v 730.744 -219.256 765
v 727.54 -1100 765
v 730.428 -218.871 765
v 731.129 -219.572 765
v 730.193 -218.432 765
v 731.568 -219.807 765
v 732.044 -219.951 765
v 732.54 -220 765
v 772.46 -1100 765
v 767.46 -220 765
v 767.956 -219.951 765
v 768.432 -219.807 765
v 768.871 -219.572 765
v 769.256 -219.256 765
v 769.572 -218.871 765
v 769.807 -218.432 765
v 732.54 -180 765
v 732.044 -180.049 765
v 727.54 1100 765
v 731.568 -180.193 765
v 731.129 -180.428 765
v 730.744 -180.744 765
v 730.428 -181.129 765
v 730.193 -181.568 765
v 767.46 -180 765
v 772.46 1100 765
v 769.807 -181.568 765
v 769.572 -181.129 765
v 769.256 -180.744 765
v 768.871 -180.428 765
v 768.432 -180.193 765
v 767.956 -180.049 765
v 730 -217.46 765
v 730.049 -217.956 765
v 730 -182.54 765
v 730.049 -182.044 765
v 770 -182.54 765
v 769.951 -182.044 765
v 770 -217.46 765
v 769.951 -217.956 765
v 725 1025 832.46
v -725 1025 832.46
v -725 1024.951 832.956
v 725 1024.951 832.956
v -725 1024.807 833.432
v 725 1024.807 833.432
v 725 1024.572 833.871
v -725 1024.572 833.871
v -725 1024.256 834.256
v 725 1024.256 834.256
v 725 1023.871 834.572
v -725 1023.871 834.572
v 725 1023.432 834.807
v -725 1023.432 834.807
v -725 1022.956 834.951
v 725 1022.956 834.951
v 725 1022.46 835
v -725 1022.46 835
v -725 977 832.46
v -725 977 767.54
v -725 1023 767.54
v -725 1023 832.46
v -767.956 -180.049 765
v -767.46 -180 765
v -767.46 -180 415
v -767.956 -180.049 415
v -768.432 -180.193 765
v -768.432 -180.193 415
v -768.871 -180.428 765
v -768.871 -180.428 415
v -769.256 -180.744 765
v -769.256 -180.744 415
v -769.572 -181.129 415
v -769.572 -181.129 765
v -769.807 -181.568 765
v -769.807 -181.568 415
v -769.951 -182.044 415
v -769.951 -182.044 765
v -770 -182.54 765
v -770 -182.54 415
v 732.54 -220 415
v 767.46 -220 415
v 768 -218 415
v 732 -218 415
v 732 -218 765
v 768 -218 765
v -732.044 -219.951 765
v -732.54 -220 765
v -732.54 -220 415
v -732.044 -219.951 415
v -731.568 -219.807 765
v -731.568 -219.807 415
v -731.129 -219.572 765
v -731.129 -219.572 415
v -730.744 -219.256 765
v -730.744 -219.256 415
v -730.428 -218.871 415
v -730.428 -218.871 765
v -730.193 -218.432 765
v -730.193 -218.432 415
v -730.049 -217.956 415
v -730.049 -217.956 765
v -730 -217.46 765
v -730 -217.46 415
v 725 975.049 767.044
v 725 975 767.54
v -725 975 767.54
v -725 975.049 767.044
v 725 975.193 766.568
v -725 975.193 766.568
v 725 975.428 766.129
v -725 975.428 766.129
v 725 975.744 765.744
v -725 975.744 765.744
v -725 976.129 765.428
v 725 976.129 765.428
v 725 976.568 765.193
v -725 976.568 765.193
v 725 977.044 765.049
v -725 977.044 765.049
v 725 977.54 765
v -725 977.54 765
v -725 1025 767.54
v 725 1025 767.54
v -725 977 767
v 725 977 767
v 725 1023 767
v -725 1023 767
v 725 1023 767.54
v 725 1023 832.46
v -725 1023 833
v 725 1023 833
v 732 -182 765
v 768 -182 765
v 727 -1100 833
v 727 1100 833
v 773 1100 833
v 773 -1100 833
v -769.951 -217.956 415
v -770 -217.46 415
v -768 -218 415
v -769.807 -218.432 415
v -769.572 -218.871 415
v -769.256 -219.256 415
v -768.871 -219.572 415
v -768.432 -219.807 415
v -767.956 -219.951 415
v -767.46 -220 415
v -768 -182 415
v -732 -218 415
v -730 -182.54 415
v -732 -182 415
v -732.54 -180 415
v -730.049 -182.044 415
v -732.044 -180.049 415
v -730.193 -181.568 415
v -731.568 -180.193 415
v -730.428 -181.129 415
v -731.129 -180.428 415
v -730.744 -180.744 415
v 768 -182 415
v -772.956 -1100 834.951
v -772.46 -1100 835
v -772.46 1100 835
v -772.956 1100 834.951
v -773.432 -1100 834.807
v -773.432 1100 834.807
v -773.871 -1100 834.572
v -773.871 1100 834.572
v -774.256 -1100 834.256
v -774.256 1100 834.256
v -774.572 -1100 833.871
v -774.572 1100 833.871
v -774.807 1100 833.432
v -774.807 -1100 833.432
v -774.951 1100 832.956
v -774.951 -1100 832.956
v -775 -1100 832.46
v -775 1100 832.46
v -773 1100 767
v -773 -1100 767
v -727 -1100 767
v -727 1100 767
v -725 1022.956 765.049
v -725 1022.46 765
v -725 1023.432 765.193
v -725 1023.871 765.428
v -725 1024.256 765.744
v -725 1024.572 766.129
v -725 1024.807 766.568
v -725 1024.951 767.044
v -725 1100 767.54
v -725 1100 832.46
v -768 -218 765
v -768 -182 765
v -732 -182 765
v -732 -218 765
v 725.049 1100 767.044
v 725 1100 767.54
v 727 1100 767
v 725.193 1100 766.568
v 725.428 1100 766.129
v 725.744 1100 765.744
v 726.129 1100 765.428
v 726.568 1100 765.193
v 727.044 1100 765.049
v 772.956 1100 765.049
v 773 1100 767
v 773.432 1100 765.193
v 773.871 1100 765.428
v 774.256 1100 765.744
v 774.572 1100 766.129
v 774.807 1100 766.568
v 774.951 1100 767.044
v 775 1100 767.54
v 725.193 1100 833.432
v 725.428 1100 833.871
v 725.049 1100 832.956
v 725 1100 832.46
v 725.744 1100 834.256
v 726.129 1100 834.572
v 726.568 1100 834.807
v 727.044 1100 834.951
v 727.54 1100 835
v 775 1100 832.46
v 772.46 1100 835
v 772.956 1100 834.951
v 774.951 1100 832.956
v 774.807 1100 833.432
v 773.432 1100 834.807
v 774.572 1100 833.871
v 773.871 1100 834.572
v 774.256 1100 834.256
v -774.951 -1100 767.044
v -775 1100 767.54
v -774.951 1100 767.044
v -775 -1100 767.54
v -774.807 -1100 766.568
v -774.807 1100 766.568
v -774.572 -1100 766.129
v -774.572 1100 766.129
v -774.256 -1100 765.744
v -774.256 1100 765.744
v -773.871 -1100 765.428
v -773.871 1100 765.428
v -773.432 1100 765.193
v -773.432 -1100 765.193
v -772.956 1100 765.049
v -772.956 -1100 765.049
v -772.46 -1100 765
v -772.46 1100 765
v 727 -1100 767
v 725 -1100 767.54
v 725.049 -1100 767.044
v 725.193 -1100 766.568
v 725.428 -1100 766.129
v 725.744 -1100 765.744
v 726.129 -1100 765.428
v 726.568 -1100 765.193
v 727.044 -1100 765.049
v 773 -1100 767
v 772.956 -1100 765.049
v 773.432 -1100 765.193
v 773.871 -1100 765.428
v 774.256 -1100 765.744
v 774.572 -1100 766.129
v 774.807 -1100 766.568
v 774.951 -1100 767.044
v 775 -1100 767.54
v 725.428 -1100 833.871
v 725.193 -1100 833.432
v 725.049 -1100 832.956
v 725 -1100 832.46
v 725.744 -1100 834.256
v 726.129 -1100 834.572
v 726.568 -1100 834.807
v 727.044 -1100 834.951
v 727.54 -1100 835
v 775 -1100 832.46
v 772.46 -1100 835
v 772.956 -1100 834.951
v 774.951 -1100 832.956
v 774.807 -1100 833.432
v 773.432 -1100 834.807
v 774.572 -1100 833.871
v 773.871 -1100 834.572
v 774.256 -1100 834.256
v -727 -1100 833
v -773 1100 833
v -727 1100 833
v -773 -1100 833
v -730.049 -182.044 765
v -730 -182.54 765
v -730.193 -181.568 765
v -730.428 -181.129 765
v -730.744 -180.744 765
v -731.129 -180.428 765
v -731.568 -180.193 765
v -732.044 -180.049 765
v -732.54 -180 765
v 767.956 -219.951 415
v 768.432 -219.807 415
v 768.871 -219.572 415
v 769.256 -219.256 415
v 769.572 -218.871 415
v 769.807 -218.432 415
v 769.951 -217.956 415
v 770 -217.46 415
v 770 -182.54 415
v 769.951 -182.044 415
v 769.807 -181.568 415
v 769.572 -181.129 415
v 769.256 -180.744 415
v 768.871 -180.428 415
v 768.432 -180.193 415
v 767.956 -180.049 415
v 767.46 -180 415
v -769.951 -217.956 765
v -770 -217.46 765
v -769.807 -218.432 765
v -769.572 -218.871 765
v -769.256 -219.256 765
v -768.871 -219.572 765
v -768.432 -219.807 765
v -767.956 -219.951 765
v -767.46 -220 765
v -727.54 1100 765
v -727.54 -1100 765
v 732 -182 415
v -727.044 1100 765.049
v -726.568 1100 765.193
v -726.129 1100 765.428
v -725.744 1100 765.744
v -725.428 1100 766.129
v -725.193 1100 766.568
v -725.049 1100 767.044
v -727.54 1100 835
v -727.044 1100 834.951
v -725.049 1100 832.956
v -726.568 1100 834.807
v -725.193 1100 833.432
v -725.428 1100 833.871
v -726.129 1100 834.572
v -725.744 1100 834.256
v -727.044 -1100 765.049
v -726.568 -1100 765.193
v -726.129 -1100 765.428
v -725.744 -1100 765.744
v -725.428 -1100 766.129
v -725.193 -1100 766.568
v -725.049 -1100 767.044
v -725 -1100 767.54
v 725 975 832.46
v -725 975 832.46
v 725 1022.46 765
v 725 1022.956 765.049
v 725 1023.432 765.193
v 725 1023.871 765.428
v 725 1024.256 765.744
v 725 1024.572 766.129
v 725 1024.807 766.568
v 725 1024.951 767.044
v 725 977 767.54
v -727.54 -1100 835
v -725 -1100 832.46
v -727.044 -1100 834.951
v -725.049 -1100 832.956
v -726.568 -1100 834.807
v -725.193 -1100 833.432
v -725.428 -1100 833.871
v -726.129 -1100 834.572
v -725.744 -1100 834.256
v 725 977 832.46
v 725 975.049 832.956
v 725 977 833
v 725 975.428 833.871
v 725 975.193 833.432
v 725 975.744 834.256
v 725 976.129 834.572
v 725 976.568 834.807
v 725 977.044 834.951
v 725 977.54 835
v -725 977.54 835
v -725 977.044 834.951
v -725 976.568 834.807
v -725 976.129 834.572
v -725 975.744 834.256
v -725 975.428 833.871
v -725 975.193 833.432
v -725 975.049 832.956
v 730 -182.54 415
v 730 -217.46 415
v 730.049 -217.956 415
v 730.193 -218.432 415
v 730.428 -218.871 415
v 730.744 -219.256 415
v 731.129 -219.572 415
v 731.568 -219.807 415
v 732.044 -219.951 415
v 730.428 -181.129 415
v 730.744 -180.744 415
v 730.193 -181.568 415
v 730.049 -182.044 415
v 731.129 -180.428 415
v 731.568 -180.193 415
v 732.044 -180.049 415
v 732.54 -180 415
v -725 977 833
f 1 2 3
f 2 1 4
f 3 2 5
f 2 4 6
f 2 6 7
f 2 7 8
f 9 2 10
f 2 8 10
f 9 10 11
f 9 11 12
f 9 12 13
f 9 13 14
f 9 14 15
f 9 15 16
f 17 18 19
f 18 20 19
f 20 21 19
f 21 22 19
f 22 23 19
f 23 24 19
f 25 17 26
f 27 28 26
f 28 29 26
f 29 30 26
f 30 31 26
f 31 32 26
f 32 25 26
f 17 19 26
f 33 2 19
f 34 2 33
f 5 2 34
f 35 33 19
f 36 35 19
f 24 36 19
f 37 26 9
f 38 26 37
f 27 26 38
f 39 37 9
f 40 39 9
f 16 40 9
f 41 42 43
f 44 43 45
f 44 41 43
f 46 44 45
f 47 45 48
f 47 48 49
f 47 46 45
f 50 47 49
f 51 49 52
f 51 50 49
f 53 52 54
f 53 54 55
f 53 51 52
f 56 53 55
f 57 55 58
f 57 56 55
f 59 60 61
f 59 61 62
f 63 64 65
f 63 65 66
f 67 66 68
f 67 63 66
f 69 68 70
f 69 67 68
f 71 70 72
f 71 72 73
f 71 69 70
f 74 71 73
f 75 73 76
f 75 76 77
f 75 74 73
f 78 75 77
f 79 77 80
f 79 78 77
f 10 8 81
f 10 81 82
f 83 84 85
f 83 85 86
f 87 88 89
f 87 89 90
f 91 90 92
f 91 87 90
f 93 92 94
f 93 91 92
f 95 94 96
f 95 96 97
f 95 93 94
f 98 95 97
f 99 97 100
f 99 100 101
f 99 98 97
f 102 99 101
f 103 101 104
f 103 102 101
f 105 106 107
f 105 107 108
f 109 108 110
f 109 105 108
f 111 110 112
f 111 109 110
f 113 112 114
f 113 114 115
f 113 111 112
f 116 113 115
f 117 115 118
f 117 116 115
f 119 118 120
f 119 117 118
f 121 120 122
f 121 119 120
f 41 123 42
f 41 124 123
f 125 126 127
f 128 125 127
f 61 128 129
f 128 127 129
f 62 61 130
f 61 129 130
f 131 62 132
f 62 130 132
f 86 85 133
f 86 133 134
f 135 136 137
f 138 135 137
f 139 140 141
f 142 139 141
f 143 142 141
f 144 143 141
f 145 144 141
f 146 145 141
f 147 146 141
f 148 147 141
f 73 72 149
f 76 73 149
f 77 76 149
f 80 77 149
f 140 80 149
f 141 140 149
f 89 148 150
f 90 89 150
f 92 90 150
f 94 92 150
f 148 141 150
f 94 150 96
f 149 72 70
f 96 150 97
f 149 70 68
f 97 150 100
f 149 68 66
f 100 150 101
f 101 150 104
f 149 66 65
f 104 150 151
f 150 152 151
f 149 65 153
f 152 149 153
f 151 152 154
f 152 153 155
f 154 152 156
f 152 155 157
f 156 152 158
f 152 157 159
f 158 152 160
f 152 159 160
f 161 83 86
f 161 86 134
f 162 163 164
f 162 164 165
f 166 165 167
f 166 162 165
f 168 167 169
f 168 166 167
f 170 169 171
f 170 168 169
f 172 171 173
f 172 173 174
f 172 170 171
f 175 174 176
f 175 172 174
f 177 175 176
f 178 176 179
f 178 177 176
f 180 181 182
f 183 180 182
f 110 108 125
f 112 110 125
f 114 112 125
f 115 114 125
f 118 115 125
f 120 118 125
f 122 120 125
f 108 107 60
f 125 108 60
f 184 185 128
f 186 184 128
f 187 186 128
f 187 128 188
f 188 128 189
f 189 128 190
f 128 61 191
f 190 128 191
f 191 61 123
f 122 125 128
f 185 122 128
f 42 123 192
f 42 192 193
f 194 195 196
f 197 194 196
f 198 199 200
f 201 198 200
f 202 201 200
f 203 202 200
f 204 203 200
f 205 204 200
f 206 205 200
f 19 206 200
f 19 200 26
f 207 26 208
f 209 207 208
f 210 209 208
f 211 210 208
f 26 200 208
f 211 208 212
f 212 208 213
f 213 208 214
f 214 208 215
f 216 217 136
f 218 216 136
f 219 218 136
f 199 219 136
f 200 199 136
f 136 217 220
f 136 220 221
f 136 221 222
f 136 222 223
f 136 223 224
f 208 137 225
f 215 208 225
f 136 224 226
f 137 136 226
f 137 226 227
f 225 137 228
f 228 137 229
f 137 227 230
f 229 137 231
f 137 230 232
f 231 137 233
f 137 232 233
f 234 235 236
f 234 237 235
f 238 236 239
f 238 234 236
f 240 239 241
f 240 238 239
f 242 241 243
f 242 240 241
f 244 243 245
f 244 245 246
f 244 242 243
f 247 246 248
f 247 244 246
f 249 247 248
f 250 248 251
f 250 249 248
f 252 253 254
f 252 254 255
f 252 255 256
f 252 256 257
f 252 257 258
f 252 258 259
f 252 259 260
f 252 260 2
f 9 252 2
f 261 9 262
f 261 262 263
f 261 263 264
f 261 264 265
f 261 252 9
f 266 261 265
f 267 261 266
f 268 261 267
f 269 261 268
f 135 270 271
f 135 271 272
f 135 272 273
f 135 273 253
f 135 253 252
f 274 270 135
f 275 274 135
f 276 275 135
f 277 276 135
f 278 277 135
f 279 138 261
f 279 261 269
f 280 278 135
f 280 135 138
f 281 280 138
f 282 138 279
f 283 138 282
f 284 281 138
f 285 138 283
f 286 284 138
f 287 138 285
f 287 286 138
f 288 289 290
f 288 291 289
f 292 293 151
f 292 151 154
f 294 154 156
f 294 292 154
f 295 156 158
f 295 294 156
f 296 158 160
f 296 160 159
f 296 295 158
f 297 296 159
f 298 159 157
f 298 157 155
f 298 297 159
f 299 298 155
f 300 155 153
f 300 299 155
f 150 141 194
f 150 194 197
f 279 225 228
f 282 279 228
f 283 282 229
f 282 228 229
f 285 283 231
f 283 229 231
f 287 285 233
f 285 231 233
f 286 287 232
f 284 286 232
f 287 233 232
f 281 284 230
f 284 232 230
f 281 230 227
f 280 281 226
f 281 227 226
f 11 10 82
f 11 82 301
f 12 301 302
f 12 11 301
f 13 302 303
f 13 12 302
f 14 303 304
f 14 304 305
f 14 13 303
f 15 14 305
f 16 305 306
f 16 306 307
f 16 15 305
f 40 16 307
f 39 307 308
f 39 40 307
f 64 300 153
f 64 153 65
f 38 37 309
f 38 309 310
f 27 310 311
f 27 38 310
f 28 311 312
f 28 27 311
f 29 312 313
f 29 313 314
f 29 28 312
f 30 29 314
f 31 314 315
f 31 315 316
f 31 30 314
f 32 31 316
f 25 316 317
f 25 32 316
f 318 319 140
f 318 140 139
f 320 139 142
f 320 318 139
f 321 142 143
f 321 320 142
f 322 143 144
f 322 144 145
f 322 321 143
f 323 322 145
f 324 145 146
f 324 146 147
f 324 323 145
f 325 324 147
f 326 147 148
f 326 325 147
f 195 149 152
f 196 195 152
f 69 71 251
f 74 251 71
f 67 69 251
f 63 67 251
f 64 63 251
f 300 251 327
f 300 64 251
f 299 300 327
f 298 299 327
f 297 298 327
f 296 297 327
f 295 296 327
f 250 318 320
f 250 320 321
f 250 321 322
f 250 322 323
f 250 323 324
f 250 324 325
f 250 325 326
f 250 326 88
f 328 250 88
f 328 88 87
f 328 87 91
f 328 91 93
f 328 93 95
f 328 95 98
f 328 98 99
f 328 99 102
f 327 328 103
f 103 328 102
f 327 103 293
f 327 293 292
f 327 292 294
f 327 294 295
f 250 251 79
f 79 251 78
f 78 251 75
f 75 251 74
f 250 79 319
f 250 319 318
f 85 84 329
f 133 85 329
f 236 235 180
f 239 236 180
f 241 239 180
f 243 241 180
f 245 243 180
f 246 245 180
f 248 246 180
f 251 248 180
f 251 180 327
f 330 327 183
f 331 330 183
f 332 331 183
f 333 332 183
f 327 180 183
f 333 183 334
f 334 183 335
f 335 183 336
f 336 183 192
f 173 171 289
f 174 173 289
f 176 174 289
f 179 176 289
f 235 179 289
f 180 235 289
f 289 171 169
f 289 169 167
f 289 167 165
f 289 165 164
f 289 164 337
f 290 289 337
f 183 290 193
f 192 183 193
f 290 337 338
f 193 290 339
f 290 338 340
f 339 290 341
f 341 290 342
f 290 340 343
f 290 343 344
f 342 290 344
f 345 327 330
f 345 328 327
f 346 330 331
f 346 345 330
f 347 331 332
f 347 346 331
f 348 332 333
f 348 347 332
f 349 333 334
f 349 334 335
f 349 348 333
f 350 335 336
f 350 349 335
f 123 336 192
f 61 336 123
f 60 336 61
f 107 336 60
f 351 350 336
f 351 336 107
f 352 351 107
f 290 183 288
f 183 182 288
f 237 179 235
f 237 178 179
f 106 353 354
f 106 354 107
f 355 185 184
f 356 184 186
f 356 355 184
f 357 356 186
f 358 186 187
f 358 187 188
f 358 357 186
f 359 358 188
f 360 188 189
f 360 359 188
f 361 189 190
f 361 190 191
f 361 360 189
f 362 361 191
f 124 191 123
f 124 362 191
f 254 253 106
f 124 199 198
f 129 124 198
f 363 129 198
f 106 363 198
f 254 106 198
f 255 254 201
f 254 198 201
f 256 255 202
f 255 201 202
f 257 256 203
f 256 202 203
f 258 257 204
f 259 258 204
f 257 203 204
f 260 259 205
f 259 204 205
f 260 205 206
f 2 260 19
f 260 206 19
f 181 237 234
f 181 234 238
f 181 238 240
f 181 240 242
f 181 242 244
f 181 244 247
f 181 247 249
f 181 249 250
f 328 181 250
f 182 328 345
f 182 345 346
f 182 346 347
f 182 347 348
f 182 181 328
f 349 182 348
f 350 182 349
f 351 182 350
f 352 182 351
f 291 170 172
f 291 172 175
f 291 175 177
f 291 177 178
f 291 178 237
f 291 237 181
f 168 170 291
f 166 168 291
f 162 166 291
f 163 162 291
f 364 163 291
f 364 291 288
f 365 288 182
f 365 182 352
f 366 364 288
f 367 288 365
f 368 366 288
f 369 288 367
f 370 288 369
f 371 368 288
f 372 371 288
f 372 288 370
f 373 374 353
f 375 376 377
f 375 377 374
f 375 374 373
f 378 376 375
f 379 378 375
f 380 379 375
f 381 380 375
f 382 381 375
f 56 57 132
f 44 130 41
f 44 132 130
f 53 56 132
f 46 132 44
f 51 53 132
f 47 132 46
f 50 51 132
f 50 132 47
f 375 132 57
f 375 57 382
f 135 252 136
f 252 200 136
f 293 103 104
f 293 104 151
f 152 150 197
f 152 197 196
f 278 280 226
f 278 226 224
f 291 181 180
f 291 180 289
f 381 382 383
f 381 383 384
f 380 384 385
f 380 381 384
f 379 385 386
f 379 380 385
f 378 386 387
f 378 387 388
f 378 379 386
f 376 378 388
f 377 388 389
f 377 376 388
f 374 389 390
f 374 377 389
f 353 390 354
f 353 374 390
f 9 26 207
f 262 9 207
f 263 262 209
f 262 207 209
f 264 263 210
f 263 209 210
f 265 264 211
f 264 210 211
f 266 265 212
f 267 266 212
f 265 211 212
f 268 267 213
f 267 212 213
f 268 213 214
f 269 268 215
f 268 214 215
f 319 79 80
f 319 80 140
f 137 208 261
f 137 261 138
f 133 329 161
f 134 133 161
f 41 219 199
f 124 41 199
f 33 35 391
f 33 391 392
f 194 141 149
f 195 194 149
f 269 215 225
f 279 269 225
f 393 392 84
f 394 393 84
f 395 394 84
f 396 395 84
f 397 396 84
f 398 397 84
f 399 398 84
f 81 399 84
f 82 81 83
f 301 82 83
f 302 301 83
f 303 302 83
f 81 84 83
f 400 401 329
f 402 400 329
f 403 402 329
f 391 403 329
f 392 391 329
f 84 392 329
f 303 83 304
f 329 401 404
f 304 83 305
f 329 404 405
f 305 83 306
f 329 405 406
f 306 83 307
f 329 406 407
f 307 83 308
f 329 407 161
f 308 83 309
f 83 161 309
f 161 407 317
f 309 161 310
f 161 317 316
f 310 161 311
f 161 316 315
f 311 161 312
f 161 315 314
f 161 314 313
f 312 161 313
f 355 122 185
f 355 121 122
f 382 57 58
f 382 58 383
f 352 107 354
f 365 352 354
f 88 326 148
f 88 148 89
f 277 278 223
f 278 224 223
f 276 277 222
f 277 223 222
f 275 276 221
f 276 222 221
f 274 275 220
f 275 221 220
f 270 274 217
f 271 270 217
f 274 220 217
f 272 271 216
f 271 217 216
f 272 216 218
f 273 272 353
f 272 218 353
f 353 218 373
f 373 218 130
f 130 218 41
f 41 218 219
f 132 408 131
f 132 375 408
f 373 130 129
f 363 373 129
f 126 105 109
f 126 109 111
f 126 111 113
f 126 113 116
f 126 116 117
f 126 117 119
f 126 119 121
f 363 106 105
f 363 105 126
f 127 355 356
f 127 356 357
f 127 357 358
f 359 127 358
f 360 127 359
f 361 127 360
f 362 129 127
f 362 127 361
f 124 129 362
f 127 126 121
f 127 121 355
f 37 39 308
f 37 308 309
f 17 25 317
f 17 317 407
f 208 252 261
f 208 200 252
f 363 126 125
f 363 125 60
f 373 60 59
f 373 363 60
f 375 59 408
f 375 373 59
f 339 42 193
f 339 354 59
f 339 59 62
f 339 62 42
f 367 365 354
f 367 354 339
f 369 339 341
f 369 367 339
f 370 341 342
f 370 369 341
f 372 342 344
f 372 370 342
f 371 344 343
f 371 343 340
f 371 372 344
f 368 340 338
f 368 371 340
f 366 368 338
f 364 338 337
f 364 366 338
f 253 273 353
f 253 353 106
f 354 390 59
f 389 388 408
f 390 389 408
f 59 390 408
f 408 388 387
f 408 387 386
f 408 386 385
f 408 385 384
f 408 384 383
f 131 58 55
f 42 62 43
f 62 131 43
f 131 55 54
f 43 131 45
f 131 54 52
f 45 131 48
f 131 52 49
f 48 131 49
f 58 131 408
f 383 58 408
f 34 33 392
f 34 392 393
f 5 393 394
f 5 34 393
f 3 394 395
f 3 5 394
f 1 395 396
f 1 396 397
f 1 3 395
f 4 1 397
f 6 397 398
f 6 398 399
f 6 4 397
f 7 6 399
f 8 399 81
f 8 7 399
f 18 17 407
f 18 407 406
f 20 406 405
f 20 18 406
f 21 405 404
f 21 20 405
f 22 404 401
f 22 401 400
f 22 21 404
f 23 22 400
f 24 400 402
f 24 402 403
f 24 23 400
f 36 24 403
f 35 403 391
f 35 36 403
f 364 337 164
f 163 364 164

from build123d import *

# Parameters (mm, degrees)
F0_W     = 46
F0_H     = 66
F1_DEPTH = 1100
F2_W     = 46
F2_H     = 66
F3_DEPTH = 725
F5_W     = 36
F5_H     = 36
F6_DEPTH = 350


with BuildPart() as f1:
    # F0 (on Front) → F1 (new body, symmetric)
    with BuildSketch(Plane.XZ):
        with BuildLine():
            ThreePointArc((775, 832.46), (774.256051, 834.256051), (772.46, 835))
            Line((772.46, 835), (727.54, 835))
            ThreePointArc((727.54, 835), (725.743949, 834.256051), (725, 832.46))
            Line((725, 832.46), (725, 767.54))
            ThreePointArc((725, 767.54), (725.743949, 765.743949), (727.54, 765))
            Line((727.54, 765), (772.46, 765))
            ThreePointArc((772.46, 765), (774.256051, 765.743949), (775, 767.54))
            Line((775, 767.54), (775, 832.46))
        make_face()
        with Locations((750, 800)):
            Rectangle(F0_W, F0_H, mode=Mode.SUBTRACT)
        with BuildLine():
            ThreePointArc((-727.54, 765), (-725.743949, 765.743949), (-725, 767.54))
            Line((-725, 767.54), (-725, 832.46))
            ThreePointArc((-725, 832.46), (-725.743949, 834.256051), (-727.54, 835))
            Line((-727.54, 835), (-772.46, 835))
            ThreePointArc((-772.46, 835), (-774.256051, 834.256051), (-775, 832.46))
            Line((-775, 832.46), (-775, 767.54))
            ThreePointArc((-775, 767.54), (-774.256051, 765.743949), (-772.46, 765))
            Line((-772.46, 765), (-727.54, 765))
        make_face()
        with Locations((-750, 800)):
            Rectangle(F0_W, F0_H, mode=Mode.SUBTRACT)
    extrude(amount=F1_DEPTH, both=True)

    # F2 (on Right) → F3 (join, symmetric)
    with BuildSketch(Plane.YZ):
        with BuildLine():
            ThreePointArc((1025, 832.46), (1024.256051, 834.256051), (1022.46, 835))
            Line((1022.46, 835), (977.54, 835))
            ThreePointArc((977.54, 835), (975.743949, 834.256051), (975, 832.46))
            Line((975, 832.46), (975, 767.54))
            ThreePointArc((975, 767.54), (975.743949, 765.743949), (977.54, 765))
            Line((977.54, 765), (1022.46, 765))
            ThreePointArc((1022.46, 765), (1024.256051, 765.743949), (1025, 767.54))
            Line((1025, 767.54), (1025, 832.46))
        make_face()
        with Locations((1000, 800)):
            Rectangle(F2_W, F2_H, mode=Mode.SUBTRACT)
    extrude(amount=F3_DEPTH, both=True)

    # F5 (on offset) → F6 (join)
    with BuildSketch(Plane.XY.offset(765)):
        with BuildLine():
            Line((767.46, -180), (732.54, -180))
            ThreePointArc((732.54, -180), (730.743949, -180.743949), (730, -182.54))
            Line((730, -182.54), (730, -217.46))
            ThreePointArc((730, -217.46), (730.743949, -219.256051), (732.54, -220))
            Line((732.54, -220), (767.46, -220))
            ThreePointArc((767.46, -220), (769.256051, -219.256051), (770, -217.46))
            Line((770, -217.46), (770, -182.54))
            ThreePointArc((770, -182.54), (769.256051, -180.743949), (767.46, -180))
        make_face()
        with Locations((750, -200)):
            Rectangle(F5_W, F5_H, mode=Mode.SUBTRACT)
        with BuildLine():
            ThreePointArc((-730, -182.54), (-730.743949, -180.743949), (-732.54, -180))
            Line((-732.54, -180), (-767.46, -180))
            ThreePointArc((-767.46, -180), (-769.256051, -180.743949), (-770, -182.54))
            Line((-770, -182.54), (-770, -217.46))
            ThreePointArc((-770, -217.46), (-769.256051, -219.256051), (-767.46, -220))
            Line((-767.46, -220), (-732.54, -220))
            ThreePointArc((-732.54, -220), (-730.743949, -219.256051), (-730, -217.46))
            Line((-730, -217.46), (-730, -182.54))
        make_face()
        with Locations((-750, -200)):
            Rectangle(F5_W, F5_H, mode=Mode.SUBTRACT)
    extrude(amount=-F6_DEPTH)


solid = f1.part
